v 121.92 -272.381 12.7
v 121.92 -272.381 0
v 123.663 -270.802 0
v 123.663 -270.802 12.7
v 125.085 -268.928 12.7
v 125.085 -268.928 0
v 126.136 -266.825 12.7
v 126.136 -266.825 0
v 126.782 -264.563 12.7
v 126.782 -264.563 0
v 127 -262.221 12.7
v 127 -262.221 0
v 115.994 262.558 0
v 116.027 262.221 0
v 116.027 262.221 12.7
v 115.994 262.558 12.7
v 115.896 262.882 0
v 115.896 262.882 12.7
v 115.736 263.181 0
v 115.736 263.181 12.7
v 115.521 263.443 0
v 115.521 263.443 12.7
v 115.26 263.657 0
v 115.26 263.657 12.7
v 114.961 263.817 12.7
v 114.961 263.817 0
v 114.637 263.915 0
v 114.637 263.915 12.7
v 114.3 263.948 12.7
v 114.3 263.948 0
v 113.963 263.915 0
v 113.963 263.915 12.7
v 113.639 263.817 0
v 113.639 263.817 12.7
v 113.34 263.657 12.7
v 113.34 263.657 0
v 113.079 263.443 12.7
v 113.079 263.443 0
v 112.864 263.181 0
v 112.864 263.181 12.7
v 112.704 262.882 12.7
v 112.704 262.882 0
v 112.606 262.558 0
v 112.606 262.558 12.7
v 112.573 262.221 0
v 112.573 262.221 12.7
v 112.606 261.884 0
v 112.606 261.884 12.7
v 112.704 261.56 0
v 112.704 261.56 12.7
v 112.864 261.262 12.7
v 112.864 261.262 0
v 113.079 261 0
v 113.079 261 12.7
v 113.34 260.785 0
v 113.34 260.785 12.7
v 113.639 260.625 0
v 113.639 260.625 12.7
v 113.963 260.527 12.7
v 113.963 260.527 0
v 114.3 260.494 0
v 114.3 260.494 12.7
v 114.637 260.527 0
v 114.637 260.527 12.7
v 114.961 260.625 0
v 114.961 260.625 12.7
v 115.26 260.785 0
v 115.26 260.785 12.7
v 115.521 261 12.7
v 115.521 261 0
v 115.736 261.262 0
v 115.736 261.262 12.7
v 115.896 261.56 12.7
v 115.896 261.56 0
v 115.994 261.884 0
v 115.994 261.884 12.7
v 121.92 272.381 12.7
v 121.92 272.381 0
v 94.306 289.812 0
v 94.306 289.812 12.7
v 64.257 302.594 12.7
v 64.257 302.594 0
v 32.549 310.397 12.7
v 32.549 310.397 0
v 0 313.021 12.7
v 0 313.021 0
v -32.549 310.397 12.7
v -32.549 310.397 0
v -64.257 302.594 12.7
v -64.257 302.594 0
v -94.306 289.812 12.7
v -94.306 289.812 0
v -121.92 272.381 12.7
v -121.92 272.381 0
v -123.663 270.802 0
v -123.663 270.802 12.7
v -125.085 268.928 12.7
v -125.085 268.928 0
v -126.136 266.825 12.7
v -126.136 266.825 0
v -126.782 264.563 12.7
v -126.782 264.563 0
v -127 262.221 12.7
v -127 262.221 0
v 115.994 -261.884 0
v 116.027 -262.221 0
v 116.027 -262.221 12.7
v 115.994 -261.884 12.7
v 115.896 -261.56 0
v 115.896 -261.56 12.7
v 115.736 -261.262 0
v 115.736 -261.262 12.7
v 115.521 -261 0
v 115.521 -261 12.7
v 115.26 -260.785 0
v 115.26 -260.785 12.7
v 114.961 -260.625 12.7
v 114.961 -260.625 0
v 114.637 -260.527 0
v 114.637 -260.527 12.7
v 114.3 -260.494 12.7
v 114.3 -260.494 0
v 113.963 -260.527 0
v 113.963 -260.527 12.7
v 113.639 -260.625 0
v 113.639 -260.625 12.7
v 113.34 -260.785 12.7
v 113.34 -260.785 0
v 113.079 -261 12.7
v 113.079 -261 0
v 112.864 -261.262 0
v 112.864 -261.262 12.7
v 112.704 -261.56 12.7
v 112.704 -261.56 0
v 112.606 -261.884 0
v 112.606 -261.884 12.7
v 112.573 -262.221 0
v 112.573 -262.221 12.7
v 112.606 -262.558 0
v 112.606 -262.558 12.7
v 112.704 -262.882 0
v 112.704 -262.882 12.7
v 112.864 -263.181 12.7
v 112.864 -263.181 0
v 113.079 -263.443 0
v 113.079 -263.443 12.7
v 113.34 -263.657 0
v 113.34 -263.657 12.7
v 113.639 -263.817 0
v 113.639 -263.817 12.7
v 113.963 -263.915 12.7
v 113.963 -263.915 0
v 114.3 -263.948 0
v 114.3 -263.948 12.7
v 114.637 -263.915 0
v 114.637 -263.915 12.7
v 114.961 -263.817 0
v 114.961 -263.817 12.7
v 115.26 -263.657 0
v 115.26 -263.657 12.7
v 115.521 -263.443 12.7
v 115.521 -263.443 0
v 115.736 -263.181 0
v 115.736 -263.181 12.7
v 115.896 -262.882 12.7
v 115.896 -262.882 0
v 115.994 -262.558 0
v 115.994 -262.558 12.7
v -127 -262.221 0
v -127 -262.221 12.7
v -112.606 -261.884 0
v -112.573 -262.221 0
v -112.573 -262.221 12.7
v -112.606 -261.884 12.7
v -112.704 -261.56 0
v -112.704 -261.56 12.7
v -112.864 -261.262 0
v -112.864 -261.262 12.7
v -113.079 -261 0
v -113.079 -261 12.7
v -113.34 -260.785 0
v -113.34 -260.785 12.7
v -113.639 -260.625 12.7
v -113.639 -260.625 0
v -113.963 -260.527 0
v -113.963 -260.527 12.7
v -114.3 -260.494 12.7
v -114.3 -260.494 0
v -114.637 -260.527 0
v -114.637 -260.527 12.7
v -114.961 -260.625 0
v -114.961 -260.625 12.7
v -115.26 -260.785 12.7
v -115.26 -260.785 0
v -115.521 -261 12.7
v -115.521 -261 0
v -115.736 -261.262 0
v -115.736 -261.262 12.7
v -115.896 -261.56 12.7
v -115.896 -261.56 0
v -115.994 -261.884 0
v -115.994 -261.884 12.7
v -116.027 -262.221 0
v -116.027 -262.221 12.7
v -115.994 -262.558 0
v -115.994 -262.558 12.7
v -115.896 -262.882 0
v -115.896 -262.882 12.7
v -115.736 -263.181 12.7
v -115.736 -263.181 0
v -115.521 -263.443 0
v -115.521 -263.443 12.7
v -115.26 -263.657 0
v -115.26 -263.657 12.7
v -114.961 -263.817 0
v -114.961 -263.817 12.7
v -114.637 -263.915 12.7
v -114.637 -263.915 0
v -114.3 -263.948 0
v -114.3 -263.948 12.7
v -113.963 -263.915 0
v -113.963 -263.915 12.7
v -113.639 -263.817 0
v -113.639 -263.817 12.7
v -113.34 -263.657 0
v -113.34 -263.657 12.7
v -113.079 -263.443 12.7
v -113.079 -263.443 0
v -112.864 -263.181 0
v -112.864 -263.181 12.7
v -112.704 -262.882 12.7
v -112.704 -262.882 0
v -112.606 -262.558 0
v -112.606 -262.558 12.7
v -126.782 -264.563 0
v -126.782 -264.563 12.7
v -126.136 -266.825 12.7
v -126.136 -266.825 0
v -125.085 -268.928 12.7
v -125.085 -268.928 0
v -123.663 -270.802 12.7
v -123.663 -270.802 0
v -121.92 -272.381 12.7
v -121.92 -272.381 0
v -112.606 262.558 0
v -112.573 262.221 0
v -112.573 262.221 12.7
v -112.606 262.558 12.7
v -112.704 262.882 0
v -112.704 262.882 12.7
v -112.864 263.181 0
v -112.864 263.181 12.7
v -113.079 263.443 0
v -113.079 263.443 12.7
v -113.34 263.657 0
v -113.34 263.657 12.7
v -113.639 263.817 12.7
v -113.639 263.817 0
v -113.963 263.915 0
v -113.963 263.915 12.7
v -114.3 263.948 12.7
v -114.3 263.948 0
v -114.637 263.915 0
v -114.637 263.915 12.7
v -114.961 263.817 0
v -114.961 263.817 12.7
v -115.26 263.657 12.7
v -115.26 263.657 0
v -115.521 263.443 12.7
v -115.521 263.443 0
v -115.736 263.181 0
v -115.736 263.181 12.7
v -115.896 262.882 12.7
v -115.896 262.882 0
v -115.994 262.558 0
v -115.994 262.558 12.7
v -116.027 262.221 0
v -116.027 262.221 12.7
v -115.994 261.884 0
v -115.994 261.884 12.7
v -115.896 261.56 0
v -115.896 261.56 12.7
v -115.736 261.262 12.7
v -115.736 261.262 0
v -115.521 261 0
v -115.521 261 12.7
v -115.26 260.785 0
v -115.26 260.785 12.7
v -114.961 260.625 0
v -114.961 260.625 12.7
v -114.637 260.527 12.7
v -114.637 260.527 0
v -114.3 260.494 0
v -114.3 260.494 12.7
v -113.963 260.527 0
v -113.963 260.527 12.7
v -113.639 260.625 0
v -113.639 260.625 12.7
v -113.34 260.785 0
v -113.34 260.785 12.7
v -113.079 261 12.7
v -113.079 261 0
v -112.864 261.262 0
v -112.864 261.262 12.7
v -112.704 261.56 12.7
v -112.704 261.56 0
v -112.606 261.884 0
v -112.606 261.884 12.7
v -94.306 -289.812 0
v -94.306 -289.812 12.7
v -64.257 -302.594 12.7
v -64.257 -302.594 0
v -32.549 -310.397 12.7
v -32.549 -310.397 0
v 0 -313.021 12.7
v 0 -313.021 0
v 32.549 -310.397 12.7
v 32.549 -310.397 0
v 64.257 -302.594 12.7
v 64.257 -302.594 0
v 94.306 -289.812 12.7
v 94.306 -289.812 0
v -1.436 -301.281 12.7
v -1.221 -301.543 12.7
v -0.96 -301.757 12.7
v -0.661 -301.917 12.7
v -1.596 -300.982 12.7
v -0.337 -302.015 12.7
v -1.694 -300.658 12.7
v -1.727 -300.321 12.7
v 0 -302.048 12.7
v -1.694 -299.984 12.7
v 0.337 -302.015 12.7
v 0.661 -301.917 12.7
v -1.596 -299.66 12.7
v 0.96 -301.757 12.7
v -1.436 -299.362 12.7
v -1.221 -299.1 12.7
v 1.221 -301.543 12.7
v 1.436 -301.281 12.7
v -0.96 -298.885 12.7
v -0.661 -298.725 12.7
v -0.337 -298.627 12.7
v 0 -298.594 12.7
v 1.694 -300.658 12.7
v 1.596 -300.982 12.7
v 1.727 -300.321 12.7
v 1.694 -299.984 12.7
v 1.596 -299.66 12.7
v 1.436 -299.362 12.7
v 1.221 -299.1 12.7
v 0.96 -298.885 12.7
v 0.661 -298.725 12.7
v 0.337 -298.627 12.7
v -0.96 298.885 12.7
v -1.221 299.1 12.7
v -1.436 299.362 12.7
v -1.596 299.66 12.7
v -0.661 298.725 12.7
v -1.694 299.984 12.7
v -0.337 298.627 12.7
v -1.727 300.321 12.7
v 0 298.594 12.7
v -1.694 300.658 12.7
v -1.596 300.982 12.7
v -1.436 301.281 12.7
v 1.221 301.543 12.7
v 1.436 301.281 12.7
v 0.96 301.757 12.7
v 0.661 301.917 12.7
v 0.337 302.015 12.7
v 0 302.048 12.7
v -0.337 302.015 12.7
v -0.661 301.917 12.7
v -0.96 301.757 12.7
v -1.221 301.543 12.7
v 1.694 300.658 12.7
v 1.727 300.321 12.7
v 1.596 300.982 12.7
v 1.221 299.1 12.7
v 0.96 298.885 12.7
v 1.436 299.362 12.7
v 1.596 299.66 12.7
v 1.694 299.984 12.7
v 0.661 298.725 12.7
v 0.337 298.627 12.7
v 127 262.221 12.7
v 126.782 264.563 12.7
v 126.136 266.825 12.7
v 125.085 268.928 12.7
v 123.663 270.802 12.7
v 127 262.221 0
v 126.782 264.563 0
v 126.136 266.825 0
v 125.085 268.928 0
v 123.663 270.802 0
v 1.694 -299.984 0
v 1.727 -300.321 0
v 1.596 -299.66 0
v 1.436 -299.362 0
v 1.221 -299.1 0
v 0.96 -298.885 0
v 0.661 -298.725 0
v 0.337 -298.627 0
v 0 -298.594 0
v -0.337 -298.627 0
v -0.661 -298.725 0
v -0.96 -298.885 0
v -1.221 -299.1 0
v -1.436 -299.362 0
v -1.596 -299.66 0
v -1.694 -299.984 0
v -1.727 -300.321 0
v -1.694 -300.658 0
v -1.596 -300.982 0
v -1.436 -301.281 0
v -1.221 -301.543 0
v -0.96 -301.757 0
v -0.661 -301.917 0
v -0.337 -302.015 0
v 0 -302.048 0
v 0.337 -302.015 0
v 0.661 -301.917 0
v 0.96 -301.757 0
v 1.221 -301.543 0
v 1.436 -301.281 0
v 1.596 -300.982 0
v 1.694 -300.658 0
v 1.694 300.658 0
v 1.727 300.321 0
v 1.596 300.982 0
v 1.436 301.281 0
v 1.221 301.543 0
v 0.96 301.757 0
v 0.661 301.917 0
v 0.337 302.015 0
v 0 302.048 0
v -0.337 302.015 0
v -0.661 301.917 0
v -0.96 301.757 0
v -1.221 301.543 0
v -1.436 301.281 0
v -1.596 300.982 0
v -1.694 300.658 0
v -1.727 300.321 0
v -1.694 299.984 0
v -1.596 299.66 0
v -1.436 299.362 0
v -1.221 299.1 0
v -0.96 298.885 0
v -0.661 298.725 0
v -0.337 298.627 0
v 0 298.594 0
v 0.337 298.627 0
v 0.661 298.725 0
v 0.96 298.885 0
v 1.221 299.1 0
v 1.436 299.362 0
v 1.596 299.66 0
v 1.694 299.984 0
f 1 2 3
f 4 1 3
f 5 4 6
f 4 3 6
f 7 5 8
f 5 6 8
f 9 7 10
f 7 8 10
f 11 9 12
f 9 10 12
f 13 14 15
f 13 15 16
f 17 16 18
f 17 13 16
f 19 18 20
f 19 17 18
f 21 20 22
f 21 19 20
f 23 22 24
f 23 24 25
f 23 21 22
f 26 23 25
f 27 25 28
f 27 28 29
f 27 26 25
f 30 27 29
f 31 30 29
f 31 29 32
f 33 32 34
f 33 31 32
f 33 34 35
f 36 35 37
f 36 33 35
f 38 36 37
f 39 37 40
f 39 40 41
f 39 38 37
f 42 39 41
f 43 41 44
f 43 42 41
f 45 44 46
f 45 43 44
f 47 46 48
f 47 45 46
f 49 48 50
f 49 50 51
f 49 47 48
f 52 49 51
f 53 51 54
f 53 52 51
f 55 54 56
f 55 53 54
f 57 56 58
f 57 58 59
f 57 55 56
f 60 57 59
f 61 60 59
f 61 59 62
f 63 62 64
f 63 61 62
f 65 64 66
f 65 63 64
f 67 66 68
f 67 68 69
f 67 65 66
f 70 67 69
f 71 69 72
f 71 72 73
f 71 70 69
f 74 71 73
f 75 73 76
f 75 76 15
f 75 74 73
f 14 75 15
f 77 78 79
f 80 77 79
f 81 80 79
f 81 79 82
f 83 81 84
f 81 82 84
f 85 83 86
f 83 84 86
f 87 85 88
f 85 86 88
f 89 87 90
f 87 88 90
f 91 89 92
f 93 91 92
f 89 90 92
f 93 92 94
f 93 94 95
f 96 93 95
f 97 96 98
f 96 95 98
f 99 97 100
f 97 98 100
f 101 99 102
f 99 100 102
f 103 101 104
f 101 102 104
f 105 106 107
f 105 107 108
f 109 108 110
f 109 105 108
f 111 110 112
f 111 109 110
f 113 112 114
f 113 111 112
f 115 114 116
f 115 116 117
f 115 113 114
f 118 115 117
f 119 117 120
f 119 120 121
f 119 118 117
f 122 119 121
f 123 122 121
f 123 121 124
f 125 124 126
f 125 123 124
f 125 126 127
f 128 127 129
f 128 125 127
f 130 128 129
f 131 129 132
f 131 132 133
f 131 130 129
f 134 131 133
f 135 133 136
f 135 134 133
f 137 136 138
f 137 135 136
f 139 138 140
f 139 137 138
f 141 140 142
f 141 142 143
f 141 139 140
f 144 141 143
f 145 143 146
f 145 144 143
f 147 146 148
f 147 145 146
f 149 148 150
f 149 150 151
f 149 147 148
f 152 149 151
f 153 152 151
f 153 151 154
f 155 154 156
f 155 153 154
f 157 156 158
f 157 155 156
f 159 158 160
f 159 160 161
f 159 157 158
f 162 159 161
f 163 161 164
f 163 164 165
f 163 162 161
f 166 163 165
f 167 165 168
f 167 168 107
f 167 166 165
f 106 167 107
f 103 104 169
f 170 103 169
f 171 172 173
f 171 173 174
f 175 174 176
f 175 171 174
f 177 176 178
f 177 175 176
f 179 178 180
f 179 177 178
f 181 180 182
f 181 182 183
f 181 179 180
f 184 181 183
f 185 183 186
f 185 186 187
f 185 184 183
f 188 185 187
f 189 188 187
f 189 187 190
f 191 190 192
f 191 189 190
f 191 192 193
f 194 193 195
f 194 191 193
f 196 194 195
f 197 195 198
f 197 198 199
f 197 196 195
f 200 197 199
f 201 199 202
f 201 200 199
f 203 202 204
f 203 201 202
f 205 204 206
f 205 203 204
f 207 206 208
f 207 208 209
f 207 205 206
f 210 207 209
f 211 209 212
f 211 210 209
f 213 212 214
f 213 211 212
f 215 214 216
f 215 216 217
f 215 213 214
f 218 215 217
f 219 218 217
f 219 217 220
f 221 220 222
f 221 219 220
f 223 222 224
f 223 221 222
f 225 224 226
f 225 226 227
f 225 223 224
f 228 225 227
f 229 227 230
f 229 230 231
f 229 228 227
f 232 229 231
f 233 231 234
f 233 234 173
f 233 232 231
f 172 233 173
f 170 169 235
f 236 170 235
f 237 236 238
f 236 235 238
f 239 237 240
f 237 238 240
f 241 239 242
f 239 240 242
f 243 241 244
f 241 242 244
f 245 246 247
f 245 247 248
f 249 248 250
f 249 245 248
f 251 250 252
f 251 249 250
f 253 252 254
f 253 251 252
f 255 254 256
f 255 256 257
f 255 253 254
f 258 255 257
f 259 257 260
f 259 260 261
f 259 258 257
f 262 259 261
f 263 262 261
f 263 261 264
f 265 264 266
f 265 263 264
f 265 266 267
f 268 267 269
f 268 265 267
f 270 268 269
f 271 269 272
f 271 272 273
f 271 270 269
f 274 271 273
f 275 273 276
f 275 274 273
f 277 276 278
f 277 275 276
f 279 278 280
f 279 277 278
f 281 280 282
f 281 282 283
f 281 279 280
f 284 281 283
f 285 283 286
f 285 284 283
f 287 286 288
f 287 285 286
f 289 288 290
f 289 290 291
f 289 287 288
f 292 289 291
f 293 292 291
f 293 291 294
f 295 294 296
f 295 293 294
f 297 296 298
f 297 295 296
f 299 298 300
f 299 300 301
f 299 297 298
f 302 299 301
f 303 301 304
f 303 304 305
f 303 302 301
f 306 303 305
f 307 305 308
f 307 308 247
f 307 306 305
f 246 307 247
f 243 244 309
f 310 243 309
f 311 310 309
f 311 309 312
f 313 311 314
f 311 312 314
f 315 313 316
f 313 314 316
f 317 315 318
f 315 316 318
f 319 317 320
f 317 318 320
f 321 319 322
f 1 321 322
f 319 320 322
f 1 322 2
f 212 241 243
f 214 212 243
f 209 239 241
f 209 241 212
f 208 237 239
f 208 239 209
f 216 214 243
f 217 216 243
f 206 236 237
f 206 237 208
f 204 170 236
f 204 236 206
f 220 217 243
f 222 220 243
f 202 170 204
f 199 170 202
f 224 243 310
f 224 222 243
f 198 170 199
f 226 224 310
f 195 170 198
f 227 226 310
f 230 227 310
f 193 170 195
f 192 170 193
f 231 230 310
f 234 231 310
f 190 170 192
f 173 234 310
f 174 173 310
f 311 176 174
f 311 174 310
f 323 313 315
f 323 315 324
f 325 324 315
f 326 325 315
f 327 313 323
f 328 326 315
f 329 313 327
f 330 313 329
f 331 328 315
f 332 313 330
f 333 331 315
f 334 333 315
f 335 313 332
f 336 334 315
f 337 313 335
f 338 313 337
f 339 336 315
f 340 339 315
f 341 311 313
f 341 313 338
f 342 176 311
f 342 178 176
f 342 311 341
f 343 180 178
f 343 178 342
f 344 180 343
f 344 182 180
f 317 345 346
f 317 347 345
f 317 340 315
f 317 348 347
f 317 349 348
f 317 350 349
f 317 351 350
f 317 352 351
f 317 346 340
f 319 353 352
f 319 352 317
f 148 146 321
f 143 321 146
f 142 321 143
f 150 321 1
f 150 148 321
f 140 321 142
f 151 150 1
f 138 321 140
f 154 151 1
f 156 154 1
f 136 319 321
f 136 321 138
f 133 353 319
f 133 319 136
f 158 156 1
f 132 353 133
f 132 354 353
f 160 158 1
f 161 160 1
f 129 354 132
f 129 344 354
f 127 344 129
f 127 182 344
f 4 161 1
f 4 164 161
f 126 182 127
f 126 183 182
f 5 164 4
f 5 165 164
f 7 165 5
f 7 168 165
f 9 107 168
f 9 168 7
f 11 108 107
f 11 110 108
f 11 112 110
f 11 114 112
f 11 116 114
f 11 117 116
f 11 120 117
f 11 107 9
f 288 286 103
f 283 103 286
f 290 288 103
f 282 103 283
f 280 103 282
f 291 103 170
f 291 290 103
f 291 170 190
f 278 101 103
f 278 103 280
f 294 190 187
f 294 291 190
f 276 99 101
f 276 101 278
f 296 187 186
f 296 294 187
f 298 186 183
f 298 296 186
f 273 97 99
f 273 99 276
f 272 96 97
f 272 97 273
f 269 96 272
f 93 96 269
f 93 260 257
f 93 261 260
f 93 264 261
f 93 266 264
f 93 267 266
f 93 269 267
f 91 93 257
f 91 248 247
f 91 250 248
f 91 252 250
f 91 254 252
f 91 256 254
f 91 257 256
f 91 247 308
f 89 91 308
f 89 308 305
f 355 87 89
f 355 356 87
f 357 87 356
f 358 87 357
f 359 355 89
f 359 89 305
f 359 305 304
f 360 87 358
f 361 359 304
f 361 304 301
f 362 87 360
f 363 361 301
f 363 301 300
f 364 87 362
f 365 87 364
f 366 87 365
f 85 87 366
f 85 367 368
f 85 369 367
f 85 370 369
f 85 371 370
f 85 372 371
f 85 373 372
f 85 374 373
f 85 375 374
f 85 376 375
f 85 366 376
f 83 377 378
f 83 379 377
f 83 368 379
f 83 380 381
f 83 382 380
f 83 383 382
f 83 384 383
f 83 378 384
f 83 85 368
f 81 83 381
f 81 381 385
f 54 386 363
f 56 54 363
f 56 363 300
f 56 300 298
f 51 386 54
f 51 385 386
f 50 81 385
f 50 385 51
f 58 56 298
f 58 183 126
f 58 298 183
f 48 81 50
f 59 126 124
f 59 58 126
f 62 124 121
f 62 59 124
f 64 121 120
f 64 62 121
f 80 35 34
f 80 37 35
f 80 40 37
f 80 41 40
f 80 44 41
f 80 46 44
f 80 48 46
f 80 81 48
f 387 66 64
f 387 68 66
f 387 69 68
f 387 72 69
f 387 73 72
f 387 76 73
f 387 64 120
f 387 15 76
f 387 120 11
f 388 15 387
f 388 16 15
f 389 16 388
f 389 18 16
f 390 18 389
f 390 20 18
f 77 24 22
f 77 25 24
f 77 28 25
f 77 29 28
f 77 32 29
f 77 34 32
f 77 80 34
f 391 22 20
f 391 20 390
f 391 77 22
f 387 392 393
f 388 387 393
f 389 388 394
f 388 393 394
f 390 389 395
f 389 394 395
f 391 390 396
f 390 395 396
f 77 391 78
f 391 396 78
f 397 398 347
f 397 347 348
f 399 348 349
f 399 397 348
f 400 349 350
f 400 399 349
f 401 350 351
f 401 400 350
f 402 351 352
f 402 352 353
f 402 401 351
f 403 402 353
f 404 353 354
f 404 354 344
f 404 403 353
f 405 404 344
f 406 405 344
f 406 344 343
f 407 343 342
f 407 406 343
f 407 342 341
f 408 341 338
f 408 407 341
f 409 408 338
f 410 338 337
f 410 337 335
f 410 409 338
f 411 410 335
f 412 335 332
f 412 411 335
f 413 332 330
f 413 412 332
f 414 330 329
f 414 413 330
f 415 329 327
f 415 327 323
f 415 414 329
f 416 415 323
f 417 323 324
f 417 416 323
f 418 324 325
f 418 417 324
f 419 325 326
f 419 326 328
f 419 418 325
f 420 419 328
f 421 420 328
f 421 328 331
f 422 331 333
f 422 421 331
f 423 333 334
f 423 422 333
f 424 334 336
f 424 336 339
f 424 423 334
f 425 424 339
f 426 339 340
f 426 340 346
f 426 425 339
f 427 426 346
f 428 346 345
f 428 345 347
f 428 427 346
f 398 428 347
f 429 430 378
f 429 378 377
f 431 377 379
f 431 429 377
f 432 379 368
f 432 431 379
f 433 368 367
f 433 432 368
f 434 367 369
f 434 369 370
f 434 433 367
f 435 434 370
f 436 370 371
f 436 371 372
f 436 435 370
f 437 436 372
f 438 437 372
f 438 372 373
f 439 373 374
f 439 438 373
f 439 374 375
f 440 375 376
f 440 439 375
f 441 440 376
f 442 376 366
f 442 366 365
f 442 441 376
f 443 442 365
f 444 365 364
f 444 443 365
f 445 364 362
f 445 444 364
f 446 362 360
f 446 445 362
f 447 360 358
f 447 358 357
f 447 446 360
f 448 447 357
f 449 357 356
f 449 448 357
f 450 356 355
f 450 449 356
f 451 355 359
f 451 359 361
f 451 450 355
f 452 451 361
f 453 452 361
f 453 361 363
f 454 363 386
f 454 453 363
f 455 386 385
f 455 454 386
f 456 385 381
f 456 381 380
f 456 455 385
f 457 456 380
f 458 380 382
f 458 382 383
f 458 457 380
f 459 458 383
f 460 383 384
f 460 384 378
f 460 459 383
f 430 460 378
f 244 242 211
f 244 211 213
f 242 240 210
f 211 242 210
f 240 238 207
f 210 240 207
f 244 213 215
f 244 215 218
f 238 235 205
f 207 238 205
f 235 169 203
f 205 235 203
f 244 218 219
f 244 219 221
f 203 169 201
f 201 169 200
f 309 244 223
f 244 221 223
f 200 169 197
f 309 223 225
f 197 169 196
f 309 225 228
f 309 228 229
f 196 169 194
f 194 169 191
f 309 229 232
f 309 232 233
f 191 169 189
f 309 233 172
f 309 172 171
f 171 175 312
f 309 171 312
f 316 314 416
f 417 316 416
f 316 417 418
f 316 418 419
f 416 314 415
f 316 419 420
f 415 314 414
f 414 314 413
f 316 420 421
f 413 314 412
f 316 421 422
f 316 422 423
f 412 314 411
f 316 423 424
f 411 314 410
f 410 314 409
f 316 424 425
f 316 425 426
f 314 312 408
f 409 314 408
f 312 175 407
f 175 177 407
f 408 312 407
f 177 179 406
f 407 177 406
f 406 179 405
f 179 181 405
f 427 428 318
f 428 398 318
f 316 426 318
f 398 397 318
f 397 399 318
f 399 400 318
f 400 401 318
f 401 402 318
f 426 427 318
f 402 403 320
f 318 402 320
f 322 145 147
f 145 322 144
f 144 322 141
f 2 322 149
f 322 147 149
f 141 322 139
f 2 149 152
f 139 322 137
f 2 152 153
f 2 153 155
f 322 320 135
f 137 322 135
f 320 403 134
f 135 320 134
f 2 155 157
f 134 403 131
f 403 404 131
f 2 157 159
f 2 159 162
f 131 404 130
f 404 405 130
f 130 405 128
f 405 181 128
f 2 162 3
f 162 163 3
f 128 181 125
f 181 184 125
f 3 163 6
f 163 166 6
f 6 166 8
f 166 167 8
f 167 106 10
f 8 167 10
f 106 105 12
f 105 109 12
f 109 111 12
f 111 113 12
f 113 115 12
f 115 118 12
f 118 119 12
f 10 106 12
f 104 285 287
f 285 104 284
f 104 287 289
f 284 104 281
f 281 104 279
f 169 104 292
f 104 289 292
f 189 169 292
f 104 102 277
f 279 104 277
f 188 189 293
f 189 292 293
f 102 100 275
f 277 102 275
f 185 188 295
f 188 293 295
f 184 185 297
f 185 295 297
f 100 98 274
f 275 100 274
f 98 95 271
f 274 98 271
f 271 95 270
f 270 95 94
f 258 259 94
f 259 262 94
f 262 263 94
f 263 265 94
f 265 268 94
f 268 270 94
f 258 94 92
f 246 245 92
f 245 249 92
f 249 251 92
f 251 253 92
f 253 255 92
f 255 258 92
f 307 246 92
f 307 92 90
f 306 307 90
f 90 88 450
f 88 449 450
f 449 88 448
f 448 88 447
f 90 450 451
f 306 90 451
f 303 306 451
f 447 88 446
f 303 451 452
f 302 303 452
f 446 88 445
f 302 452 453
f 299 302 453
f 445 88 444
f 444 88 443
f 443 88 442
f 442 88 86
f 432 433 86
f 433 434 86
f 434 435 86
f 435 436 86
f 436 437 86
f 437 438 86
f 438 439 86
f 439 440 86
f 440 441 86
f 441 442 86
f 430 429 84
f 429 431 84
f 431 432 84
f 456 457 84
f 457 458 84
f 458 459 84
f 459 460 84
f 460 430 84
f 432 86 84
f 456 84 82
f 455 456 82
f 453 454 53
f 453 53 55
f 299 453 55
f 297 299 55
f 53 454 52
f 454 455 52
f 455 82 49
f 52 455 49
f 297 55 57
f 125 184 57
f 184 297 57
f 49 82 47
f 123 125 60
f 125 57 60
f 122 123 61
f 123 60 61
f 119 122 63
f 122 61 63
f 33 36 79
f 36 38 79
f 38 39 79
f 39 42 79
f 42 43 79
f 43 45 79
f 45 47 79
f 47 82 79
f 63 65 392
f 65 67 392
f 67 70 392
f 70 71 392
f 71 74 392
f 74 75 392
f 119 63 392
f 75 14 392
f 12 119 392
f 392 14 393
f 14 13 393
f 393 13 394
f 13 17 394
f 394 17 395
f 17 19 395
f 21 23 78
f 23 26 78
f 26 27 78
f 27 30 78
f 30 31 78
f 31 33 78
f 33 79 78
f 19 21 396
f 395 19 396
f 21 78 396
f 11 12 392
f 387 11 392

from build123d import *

# Parameters (mm, degrees)
F0_R     = 1.7272
F1_DEPTH = 12.7


with BuildPart() as f1:
    # F0 (on Top) → F1 (new body)
    with BuildSketch(Plane.XY):
        with BuildLine():
            Line((127, -262.221193), (127, 262.221193))
            ThreePointArc((127, 262.221193), (125.659225, 267.900805), (121.92, 272.381193))
            ThreePointArc((121.92, 272.381193), (0, 313.021193), (-121.92, 272.381193))
            ThreePointArc((-121.92, 272.381193), (-125.659225, 267.900805), (-127, 262.221193))
            Line((-127, 262.221193), (-127, -262.221193))
            ThreePointArc((-127, -262.221193), (-125.659225, -267.900805), (-121.92, -272.381193))
            ThreePointArc((-121.92, -272.381193), (0, -313.021193), (121.92, -272.381193))
            ThreePointArc((121.92, -272.381193), (125.659225, -267.900805), (127, -262.221193))
        make_face()
        with Locations((-114.3, -262.221193)):
            Circle(F0_R, mode=Mode.SUBTRACT)
        with Locations((0, -300.321193)):
            Circle(F0_R, mode=Mode.SUBTRACT)
        with Locations((114.3, -262.221193)):
            Circle(F0_R, mode=Mode.SUBTRACT)
        with Locations((-114.3, 262.221193)):
            Circle(F0_R, mode=Mode.SUBTRACT)
        with Locations((0, 300.321193)):
            Circle(F0_R, mode=Mode.SUBTRACT)
        with Locations((114.3, 262.221193)):
            Circle(F0_R, mode=Mode.SUBTRACT)
    extrude(amount=F1_DEPTH)


solid = f1.part
